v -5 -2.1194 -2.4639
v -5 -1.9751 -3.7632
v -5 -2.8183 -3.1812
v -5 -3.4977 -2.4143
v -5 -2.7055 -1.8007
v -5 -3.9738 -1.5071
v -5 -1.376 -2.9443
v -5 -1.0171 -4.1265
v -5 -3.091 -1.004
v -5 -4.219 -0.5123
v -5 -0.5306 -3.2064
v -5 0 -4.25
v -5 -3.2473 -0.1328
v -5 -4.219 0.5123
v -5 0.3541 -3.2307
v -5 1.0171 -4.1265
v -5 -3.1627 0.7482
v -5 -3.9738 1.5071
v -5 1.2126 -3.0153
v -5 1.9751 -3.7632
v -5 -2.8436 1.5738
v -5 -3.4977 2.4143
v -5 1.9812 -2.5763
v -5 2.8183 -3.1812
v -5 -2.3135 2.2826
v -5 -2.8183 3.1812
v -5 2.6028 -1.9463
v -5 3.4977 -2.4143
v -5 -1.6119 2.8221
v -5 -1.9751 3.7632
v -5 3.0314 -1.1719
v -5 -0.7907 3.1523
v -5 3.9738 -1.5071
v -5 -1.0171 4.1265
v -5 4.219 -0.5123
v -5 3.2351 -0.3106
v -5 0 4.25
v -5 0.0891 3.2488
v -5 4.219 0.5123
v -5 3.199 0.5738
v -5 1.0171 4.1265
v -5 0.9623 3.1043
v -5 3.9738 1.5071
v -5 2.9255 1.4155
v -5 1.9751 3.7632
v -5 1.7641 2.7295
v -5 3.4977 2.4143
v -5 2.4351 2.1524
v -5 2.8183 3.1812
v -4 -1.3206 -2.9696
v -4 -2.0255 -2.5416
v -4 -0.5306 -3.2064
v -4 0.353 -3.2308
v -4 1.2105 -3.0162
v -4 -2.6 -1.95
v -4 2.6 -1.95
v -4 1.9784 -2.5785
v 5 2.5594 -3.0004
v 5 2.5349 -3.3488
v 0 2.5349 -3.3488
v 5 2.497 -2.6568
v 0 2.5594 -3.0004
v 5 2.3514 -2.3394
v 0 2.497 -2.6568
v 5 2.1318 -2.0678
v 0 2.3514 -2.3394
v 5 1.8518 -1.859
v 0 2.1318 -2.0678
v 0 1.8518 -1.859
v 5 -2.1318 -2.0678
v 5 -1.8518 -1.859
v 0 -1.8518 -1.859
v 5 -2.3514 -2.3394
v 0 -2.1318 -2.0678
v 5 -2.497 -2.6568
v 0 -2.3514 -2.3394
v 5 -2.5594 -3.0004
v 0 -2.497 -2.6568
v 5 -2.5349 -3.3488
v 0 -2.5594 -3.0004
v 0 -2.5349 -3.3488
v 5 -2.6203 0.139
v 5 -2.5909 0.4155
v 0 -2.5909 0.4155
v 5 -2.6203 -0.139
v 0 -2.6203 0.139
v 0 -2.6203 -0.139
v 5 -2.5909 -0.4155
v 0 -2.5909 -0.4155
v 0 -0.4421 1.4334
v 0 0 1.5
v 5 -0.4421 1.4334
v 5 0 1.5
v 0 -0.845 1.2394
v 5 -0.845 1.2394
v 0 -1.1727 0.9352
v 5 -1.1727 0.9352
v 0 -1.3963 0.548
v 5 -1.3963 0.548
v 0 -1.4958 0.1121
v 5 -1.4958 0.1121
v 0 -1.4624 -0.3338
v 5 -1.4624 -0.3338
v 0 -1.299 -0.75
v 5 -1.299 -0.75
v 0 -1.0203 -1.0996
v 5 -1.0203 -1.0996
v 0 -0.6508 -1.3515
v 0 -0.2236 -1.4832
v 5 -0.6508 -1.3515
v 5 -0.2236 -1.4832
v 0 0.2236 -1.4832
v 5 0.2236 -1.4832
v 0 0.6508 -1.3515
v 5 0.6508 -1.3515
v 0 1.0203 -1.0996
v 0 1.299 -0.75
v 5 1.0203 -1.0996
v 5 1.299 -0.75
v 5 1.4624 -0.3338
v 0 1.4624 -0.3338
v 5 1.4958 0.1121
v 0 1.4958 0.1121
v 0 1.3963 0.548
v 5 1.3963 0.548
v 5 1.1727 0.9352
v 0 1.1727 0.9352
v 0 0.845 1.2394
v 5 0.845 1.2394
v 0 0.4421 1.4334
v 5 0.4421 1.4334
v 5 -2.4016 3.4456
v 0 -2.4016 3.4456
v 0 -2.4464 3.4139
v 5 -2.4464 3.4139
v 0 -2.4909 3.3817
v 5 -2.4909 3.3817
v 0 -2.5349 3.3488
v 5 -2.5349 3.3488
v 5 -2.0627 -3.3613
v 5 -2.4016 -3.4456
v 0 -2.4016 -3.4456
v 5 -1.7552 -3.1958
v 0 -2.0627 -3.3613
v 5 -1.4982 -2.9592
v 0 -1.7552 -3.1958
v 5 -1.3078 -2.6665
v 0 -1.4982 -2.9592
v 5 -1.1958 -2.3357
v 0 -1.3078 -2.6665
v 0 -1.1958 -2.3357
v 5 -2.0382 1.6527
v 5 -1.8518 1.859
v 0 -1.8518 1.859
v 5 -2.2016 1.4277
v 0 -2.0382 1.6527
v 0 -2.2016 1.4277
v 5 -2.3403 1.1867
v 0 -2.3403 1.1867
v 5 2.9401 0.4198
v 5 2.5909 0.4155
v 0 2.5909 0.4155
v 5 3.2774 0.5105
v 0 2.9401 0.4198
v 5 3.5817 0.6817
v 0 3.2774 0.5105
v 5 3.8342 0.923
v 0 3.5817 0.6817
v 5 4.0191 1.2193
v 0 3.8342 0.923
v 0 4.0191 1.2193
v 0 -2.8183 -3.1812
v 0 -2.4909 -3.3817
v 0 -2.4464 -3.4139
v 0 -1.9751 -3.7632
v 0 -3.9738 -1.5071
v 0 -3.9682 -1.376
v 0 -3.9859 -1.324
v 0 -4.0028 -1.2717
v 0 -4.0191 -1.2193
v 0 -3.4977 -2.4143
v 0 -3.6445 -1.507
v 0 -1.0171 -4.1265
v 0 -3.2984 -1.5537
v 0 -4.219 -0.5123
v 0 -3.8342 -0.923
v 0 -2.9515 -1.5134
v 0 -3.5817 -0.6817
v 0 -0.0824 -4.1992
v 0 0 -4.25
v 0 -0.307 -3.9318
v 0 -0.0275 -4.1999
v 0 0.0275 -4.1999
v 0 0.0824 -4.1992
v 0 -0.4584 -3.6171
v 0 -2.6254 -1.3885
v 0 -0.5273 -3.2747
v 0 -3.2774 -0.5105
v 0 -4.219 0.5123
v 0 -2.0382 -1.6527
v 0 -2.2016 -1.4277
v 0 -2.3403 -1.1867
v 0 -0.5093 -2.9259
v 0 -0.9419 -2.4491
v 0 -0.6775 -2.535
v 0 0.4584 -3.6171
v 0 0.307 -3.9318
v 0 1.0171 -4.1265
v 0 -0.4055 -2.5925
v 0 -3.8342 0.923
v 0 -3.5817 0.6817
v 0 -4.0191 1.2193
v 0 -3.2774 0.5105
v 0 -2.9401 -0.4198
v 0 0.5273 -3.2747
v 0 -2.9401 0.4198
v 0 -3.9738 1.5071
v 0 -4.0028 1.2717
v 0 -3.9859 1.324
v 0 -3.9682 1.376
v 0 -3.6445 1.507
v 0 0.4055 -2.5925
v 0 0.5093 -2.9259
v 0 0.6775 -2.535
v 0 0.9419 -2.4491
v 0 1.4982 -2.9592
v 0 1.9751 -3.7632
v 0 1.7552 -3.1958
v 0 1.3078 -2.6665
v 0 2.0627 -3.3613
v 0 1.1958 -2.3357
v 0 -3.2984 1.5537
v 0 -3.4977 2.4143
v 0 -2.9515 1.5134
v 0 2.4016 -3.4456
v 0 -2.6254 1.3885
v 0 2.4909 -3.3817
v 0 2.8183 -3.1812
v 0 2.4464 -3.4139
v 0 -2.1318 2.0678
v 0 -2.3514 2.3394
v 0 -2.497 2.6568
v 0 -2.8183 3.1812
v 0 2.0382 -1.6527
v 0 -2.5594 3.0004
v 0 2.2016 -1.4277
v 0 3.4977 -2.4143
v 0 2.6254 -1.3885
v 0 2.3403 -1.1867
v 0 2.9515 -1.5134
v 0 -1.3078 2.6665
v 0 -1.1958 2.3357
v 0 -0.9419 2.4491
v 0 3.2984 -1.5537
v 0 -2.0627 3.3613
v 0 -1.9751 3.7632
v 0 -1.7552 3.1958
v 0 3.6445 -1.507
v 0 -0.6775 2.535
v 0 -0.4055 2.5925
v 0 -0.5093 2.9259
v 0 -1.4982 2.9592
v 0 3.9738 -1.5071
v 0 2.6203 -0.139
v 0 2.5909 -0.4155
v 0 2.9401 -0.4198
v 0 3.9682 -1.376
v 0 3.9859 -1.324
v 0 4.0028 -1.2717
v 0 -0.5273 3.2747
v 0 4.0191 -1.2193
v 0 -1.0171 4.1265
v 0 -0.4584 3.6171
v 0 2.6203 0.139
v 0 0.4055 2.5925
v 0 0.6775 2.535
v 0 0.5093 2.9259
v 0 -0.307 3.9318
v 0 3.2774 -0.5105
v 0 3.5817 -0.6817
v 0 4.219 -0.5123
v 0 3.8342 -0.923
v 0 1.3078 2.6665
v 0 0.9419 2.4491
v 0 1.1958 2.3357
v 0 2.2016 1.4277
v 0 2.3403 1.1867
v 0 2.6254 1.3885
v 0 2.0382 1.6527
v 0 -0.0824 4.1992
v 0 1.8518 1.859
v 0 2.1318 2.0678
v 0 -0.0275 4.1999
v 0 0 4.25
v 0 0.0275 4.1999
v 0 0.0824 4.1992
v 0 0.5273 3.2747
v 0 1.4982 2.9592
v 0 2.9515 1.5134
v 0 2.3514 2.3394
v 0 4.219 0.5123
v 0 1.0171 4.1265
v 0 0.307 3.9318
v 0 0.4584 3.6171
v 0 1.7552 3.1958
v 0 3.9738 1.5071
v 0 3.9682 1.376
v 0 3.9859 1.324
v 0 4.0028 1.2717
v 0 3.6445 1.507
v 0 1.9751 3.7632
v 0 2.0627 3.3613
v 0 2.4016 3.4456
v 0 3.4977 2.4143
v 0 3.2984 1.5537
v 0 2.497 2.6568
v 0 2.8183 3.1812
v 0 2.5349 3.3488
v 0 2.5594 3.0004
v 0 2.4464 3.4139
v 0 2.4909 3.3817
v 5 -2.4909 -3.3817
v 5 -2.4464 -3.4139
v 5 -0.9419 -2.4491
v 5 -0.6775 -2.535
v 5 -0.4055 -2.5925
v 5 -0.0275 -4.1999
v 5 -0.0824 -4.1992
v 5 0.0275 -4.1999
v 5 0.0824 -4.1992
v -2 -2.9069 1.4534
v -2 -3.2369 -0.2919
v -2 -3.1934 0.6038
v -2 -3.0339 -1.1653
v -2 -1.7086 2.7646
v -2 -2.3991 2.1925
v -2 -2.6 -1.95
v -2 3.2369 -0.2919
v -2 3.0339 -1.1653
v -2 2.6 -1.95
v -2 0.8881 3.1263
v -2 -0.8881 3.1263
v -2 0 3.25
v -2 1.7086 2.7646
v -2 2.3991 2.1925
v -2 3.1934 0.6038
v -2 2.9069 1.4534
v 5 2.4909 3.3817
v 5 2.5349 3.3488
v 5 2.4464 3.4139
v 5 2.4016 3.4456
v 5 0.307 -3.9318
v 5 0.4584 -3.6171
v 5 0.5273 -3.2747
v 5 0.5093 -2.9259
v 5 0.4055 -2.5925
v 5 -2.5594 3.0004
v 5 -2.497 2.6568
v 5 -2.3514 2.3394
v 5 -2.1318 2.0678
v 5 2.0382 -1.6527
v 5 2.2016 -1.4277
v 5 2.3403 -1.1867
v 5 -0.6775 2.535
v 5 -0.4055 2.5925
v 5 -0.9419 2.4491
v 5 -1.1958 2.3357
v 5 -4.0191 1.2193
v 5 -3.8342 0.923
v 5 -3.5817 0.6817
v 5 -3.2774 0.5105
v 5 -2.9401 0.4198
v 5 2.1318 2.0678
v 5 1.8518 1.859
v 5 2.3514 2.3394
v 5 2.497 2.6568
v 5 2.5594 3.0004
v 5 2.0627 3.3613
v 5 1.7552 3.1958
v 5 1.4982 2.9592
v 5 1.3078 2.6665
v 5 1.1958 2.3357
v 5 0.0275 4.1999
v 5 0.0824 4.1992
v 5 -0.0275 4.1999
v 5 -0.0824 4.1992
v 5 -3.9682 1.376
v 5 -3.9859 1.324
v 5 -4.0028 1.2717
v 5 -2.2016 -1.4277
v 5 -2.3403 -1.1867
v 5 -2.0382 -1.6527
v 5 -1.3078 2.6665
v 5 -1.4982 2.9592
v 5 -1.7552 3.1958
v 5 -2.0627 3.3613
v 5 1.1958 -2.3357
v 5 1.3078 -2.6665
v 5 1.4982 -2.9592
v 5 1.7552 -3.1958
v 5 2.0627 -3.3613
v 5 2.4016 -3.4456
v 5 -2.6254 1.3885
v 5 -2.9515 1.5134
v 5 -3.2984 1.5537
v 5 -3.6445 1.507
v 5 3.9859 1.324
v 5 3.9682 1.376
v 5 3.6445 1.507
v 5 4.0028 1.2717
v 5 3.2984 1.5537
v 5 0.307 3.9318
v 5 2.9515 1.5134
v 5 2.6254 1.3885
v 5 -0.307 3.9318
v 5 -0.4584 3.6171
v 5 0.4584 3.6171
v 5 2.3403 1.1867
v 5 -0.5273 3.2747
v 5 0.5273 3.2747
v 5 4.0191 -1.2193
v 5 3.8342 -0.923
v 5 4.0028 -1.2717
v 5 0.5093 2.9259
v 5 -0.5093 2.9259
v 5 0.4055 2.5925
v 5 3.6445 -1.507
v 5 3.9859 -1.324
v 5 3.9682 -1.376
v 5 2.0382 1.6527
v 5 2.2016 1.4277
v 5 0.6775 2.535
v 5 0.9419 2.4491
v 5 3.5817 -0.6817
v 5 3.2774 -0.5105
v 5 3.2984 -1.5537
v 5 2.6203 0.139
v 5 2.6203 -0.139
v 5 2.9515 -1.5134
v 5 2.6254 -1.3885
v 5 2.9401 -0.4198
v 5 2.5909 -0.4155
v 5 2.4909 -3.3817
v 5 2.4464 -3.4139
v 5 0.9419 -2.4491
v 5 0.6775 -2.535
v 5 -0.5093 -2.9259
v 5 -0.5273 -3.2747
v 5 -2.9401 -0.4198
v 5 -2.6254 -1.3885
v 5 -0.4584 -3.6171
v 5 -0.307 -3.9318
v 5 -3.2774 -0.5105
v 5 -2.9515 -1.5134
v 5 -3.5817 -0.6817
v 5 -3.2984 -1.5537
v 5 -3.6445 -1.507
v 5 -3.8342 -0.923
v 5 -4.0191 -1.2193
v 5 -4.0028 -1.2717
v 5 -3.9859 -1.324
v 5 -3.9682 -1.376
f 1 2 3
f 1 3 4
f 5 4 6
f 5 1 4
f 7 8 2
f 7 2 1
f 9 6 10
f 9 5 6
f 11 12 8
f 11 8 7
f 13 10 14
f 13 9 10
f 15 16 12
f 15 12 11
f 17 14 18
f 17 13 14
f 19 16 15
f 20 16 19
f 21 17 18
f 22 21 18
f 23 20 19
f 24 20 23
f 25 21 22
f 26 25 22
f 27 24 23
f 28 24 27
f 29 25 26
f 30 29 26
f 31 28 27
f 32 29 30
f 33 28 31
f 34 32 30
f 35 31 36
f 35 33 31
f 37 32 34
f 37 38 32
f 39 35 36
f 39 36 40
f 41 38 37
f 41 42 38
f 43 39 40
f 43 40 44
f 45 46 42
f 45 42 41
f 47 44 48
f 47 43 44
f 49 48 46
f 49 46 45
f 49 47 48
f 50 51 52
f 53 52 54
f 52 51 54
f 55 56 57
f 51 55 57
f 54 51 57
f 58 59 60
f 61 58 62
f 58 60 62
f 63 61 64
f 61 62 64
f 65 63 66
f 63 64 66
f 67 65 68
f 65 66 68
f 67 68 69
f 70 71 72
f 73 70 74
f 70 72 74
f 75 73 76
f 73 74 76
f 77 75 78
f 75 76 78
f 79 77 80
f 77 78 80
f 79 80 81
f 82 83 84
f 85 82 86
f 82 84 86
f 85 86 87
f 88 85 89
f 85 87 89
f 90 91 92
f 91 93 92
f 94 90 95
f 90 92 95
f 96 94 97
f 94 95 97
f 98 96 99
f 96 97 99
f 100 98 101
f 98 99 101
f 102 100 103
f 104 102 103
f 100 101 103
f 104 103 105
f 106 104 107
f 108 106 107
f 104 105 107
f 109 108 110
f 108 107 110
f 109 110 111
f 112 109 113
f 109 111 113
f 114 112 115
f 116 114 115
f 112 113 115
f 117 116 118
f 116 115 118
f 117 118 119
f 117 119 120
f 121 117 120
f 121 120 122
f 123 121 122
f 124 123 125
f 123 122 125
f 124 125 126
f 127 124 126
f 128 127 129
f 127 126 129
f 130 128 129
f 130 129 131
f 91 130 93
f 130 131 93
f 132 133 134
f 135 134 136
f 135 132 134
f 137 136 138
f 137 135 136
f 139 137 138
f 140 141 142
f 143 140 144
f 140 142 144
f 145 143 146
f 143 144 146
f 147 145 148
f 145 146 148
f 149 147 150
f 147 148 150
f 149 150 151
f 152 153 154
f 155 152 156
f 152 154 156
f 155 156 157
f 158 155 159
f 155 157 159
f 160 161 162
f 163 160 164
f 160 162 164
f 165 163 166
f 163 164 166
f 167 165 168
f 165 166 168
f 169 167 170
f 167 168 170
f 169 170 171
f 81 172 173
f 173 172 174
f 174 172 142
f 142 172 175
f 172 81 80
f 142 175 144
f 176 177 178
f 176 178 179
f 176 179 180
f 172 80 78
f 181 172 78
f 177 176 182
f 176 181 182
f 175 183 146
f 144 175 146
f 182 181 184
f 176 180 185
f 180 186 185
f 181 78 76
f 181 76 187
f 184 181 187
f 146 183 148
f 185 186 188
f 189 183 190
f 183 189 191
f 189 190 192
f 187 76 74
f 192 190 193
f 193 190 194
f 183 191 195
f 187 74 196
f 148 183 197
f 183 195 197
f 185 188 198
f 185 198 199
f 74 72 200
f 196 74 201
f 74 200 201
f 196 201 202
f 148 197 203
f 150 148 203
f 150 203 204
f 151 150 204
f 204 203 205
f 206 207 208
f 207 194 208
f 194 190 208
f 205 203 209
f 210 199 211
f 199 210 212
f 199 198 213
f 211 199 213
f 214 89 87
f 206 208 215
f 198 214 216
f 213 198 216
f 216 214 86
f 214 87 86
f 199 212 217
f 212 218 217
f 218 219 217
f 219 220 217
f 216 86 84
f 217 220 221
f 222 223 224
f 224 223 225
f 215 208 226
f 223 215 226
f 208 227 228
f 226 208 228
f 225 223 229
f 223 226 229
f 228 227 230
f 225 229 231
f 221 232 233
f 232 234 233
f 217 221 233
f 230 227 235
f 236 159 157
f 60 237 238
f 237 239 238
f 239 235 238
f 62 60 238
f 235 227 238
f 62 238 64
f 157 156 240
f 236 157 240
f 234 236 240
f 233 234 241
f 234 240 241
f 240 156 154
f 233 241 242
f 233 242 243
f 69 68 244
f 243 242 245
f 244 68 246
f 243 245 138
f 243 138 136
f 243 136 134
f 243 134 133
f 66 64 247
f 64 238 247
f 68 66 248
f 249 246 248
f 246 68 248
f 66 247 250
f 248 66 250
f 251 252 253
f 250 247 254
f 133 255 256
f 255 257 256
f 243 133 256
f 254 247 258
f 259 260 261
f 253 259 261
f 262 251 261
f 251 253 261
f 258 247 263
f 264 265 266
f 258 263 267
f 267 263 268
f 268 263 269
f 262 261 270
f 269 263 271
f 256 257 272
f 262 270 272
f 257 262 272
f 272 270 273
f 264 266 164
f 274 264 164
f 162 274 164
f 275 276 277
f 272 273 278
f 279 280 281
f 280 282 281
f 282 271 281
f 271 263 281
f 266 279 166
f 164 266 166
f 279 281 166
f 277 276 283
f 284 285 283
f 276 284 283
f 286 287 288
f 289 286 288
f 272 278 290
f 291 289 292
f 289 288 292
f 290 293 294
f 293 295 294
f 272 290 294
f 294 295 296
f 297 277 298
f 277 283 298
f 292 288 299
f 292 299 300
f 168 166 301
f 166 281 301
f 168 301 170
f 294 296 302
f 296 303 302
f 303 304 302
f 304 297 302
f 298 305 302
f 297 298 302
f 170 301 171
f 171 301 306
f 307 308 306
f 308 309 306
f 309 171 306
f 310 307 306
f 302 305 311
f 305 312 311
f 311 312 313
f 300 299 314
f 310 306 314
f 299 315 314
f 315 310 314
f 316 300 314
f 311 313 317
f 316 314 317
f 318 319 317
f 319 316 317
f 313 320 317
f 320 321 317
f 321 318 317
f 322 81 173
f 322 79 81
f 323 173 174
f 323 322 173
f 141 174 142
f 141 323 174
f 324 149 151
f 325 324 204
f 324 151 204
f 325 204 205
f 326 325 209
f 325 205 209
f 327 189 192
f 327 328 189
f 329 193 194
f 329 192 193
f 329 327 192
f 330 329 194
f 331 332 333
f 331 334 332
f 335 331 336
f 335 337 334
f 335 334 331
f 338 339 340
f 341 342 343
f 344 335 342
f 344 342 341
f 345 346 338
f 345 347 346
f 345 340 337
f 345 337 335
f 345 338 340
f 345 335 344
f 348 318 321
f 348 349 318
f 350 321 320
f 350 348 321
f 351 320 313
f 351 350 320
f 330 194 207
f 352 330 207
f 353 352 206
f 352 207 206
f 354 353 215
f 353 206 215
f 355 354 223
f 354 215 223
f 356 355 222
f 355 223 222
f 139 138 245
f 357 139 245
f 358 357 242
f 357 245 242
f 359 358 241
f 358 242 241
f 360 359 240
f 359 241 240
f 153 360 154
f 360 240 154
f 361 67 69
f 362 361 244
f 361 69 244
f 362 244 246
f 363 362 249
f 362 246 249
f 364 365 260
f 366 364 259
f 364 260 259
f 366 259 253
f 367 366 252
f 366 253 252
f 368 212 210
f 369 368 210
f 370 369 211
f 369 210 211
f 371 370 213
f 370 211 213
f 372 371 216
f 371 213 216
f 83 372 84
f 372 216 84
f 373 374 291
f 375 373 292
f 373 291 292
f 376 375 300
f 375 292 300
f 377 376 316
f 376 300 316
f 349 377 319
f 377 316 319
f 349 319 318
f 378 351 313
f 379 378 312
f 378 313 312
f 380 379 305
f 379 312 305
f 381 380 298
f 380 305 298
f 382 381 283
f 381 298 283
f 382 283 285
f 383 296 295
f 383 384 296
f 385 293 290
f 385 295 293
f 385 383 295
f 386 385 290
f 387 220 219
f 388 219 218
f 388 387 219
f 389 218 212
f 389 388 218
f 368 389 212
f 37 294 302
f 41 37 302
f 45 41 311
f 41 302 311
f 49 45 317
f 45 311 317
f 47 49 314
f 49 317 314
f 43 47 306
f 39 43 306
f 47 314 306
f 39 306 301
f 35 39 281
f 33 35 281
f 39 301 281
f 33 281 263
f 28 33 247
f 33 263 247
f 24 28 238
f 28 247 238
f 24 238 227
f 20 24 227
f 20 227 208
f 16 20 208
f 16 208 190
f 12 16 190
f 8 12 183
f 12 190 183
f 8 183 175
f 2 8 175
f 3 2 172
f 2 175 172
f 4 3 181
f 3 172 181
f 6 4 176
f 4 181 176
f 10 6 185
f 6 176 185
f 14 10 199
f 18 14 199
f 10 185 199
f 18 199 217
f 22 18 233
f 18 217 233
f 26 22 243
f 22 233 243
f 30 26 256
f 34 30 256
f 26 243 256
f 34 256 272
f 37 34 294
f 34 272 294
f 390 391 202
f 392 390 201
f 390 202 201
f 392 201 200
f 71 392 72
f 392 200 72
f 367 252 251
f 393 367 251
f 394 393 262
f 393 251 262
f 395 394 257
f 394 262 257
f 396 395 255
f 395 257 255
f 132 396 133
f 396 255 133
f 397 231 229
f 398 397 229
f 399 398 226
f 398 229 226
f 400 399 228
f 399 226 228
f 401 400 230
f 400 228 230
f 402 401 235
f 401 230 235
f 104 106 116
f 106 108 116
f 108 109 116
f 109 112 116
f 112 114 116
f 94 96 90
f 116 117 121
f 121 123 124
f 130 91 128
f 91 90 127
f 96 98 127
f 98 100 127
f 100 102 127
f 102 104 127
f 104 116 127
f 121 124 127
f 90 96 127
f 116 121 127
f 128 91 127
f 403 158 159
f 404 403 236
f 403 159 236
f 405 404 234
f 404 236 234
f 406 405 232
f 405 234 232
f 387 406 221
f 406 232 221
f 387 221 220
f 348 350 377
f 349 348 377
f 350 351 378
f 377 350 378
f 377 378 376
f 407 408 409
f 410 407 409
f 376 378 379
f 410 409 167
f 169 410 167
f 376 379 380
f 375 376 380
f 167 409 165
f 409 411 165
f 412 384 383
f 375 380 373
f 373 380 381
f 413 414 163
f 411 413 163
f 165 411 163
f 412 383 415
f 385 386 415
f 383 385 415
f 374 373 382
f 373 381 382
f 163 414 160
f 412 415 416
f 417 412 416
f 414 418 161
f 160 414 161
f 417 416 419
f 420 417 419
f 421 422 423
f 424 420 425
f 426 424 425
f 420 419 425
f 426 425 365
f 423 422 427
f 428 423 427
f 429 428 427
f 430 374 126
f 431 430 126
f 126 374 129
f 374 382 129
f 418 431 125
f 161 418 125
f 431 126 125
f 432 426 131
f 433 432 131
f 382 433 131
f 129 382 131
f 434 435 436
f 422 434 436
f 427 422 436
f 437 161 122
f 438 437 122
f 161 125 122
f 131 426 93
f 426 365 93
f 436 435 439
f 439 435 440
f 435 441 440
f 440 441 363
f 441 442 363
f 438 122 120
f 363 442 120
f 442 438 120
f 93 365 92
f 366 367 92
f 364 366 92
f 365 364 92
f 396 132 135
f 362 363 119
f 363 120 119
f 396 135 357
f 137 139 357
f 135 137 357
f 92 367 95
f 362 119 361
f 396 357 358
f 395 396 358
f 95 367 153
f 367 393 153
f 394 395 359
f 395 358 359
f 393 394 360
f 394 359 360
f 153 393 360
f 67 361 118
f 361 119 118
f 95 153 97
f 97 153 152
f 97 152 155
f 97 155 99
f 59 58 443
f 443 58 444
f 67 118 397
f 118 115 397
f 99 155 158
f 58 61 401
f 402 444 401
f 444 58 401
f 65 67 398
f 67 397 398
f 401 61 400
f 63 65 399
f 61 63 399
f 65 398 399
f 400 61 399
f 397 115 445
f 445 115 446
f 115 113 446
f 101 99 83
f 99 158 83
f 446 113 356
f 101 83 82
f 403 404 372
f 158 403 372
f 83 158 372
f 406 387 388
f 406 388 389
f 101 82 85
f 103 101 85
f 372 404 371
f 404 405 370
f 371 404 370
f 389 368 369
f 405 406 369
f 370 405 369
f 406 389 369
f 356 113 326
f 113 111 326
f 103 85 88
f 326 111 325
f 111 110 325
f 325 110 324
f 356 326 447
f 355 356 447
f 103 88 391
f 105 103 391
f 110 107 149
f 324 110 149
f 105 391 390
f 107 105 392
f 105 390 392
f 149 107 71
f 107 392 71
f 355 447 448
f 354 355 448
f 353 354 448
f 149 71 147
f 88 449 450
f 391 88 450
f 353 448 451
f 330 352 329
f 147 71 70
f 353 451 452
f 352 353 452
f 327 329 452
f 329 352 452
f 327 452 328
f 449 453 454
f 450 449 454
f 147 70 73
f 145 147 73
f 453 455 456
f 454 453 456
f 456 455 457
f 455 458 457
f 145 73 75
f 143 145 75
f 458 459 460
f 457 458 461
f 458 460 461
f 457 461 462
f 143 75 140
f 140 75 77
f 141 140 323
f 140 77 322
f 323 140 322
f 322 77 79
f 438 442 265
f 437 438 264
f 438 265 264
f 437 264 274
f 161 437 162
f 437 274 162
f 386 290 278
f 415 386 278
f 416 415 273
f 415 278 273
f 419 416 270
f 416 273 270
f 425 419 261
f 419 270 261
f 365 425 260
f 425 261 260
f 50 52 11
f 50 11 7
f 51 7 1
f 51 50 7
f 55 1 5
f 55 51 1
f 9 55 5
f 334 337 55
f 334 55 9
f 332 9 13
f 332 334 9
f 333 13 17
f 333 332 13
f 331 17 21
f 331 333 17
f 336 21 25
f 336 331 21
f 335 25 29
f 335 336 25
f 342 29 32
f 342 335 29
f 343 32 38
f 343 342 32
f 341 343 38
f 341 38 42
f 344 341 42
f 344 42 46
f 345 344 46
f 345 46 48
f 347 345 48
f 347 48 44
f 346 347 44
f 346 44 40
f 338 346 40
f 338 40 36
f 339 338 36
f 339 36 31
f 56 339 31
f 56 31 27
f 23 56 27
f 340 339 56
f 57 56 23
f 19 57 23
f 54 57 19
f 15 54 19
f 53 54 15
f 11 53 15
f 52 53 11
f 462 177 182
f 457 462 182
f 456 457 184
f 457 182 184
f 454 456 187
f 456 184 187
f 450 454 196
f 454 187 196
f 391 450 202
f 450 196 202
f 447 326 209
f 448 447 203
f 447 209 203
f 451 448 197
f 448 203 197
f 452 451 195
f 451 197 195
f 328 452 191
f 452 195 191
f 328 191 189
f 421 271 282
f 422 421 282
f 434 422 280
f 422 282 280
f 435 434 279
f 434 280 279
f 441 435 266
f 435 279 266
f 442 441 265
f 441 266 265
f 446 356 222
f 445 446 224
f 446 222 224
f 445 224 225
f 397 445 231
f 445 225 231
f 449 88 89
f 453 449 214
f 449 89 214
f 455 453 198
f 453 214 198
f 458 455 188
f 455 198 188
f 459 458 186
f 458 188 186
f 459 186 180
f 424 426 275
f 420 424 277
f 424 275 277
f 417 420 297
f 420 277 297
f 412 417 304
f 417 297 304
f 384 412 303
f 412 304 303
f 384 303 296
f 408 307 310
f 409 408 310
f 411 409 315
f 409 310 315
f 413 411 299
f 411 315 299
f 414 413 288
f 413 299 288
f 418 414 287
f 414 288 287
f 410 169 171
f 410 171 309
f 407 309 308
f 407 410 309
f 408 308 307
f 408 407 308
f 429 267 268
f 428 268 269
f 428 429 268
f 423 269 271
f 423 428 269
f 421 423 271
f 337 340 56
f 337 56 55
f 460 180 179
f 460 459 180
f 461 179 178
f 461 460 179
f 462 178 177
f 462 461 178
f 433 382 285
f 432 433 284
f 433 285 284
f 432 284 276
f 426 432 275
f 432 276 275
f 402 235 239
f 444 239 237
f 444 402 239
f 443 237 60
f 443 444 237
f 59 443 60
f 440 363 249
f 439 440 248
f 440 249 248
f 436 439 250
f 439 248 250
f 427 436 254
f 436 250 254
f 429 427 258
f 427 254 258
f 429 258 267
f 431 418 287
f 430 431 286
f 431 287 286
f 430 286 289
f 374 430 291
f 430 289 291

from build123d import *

# Parameters (mm, degrees)
BASPROSKE_W             = 5
BASPROSKE_H             = 4.2
TOOTHCUT_DEPTH          = 8.764019578
TEETHCUTS_COUNT         = 10
TEETHCUTS_ANGLE         = 324
BORSKE_R                = 1.5
BORE_DEPTH              = 50.0000508
CROQUIS1_R              = 4.25
CROQUIS1_R_2            = 3.25
SALIENTE_EXTRUIR1_DEPTH = 5
CROQUIS2_R              = 3.25
SALIENTE_EXTRUIR2_DEPTH = 2
SALIENTE_EXTRUIR3_DEPTH = 2


with BuildPart() as part:
    # BasProSke → Base-Revolve (revolve)
    with BuildSketch(Plane(origin=(0, 0, 0), x_dir=(1, 0, 0), z_dir=(0, 1, 0)), mode=Mode.PRIVATE) as base_revolve_sk:
        with Locations((2.5, 2.1)):
            Rectangle(BASPROSKE_W, BASPROSKE_H)
    revolve(base_revolve_sk.sketch.rotate(Axis((-10, 0, 0), (1, 0, 0)), 180), axis=Axis((-10, 0, 0), (1, 0, 0)))

    # TooCutSke → ToothCut (cut, through all)
    with BuildSketch(Plane(origin=(0, 0, 0), x_dir=(0, 0, -1), z_dir=(1, 0, 0))):
        with BuildLine():
            ThreePointArc((0.415506654, 2.590893711), (0, 2.624), (-0.415506654, 2.590893711))
            ThreePointArc((-0.415506654, 2.590893711), (-0.596160737, 3.451685568), (-1.254578949, 4.034852763))
            ThreePointArc((-1.254578949, 4.034852763), (0, 4.2254), (1.254578949, 4.034852763))
            ThreePointArc((1.254578949, 4.034852763), (0.596160737, 3.451685568), (0.415506654, 2.590893711))
        make_face()
    toothcut = extrude(amount=TOOTHCUT_DEPTH, mode=Mode.SUBTRACT)

    # TeethCuts: ToothCut ×10 about axis
    teethcuts_axis = Axis((-10, 0, 0), (1, 0, 0))
    for i in range(1, TEETHCUTS_COUNT):
        add(toothcut.rotate(teethcuts_axis, i * TEETHCUTS_ANGLE / (TEETHCUTS_COUNT - 1)), mode=Mode.SUBTRACT)

    # BorSke → Bore (cut, symmetric)
    with BuildSketch(Plane(origin=(0, 0, 0), x_dir=(0, 0, -1), z_dir=(1, 0, 0))):
        with Locations(Location((0, 0, 0), (0, 0, 180))):
            Circle(BORSKE_R)
    extrude(amount=BORE_DEPTH, both=True, mode=Mode.SUBTRACT)

    # Croquis1 → Saliente-Extruir1 (add)
    with BuildSketch(Plane.ZY):
        Circle(CROQUIS1_R)
        with Locations(Location((0, 0, 0), (0, 0, 189.396976621))):
            Circle(CROQUIS1_R_2, mode=Mode.SUBTRACT)
    extrude(amount=SALIENTE_EXTRUIR1_DEPTH)

    # Croquis2 → Saliente-Extruir2 (add)
    with BuildSketch(Plane.ZY):
        Circle(CROQUIS2_R)
    extrude(amount=SALIENTE_EXTRUIR2_DEPTH)

    # Croquis3 → Saliente-Extruir3 (add)
    with BuildSketch(Plane.ZY.offset(2)):
        with BuildLine():
            Line((-1.95, 2.6), (-1.95, -2.6))
            ThreePointArc((-1.95, -2.6), (-3.25, 0), (-1.95, 2.6))
        make_face()
    extrude(amount=SALIENTE_EXTRUIR3_DEPTH)


solid = part.part
